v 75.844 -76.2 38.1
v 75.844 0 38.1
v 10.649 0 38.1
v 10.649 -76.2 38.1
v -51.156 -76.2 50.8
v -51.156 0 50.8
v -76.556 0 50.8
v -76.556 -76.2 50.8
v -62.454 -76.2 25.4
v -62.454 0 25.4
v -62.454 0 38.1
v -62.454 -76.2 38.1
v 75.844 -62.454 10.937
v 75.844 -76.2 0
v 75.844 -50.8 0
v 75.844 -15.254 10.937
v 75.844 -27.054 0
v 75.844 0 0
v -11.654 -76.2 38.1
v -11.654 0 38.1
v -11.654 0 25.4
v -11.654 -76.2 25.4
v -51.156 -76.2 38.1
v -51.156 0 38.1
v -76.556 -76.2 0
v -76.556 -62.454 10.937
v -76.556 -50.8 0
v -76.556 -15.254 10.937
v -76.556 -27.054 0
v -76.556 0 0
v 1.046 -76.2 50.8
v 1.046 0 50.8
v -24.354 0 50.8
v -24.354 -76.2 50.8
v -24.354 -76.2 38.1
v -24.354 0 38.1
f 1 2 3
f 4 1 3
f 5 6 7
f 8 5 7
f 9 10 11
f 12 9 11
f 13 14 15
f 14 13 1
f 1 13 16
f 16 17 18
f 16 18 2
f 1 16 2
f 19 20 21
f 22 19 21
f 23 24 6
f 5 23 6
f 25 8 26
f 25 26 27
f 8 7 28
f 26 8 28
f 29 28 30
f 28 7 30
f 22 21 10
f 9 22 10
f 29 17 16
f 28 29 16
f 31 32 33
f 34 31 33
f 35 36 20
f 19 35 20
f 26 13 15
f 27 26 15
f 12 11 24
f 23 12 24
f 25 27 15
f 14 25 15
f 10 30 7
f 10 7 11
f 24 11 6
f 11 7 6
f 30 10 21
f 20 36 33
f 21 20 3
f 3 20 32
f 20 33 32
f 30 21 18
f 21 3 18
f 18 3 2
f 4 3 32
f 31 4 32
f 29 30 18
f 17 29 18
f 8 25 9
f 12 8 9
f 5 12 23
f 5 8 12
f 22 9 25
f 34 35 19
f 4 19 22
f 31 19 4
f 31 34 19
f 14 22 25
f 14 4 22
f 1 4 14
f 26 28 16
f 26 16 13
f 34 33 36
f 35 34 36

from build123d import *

# Parameters (mm, degrees)
F1_DEPTH = 76.2
F3_DEPTH = 152.4


with BuildPart() as f1:
    # F0 (on Front) → F1 (new body)
    with BuildSketch(Plane.XZ):
        Polygon((-76.556332, 50.8), (-76.556332, 0), (75.843668, 0), (75.843668, 38.1), (39.717197, 38.1), (10.648812, 38.1), (1.046149, 50.8), (-24.353851, 50.8), (-24.353851, 38.1), (-11.653851, 38.1), (-11.653851, 25.4), (-62.453851, 25.4), (-62.453851, 38.1), (-51.156332, 38.1), (-51.156332, 50.8), align=None)
    extrude(amount=F1_DEPTH)

    # F2 (on face) → F3 (cut, through all)
    with BuildSketch(Plane.YZ.offset(75.843668)):
        Polygon((-62.453851, 10.936619), (-50.8, 0), (-27.053742, 0), (-15.253706, 10.936619), align=None)
    extrude(amount=-F3_DEPTH, mode=Mode.SUBTRACT)


solid = f1.part
